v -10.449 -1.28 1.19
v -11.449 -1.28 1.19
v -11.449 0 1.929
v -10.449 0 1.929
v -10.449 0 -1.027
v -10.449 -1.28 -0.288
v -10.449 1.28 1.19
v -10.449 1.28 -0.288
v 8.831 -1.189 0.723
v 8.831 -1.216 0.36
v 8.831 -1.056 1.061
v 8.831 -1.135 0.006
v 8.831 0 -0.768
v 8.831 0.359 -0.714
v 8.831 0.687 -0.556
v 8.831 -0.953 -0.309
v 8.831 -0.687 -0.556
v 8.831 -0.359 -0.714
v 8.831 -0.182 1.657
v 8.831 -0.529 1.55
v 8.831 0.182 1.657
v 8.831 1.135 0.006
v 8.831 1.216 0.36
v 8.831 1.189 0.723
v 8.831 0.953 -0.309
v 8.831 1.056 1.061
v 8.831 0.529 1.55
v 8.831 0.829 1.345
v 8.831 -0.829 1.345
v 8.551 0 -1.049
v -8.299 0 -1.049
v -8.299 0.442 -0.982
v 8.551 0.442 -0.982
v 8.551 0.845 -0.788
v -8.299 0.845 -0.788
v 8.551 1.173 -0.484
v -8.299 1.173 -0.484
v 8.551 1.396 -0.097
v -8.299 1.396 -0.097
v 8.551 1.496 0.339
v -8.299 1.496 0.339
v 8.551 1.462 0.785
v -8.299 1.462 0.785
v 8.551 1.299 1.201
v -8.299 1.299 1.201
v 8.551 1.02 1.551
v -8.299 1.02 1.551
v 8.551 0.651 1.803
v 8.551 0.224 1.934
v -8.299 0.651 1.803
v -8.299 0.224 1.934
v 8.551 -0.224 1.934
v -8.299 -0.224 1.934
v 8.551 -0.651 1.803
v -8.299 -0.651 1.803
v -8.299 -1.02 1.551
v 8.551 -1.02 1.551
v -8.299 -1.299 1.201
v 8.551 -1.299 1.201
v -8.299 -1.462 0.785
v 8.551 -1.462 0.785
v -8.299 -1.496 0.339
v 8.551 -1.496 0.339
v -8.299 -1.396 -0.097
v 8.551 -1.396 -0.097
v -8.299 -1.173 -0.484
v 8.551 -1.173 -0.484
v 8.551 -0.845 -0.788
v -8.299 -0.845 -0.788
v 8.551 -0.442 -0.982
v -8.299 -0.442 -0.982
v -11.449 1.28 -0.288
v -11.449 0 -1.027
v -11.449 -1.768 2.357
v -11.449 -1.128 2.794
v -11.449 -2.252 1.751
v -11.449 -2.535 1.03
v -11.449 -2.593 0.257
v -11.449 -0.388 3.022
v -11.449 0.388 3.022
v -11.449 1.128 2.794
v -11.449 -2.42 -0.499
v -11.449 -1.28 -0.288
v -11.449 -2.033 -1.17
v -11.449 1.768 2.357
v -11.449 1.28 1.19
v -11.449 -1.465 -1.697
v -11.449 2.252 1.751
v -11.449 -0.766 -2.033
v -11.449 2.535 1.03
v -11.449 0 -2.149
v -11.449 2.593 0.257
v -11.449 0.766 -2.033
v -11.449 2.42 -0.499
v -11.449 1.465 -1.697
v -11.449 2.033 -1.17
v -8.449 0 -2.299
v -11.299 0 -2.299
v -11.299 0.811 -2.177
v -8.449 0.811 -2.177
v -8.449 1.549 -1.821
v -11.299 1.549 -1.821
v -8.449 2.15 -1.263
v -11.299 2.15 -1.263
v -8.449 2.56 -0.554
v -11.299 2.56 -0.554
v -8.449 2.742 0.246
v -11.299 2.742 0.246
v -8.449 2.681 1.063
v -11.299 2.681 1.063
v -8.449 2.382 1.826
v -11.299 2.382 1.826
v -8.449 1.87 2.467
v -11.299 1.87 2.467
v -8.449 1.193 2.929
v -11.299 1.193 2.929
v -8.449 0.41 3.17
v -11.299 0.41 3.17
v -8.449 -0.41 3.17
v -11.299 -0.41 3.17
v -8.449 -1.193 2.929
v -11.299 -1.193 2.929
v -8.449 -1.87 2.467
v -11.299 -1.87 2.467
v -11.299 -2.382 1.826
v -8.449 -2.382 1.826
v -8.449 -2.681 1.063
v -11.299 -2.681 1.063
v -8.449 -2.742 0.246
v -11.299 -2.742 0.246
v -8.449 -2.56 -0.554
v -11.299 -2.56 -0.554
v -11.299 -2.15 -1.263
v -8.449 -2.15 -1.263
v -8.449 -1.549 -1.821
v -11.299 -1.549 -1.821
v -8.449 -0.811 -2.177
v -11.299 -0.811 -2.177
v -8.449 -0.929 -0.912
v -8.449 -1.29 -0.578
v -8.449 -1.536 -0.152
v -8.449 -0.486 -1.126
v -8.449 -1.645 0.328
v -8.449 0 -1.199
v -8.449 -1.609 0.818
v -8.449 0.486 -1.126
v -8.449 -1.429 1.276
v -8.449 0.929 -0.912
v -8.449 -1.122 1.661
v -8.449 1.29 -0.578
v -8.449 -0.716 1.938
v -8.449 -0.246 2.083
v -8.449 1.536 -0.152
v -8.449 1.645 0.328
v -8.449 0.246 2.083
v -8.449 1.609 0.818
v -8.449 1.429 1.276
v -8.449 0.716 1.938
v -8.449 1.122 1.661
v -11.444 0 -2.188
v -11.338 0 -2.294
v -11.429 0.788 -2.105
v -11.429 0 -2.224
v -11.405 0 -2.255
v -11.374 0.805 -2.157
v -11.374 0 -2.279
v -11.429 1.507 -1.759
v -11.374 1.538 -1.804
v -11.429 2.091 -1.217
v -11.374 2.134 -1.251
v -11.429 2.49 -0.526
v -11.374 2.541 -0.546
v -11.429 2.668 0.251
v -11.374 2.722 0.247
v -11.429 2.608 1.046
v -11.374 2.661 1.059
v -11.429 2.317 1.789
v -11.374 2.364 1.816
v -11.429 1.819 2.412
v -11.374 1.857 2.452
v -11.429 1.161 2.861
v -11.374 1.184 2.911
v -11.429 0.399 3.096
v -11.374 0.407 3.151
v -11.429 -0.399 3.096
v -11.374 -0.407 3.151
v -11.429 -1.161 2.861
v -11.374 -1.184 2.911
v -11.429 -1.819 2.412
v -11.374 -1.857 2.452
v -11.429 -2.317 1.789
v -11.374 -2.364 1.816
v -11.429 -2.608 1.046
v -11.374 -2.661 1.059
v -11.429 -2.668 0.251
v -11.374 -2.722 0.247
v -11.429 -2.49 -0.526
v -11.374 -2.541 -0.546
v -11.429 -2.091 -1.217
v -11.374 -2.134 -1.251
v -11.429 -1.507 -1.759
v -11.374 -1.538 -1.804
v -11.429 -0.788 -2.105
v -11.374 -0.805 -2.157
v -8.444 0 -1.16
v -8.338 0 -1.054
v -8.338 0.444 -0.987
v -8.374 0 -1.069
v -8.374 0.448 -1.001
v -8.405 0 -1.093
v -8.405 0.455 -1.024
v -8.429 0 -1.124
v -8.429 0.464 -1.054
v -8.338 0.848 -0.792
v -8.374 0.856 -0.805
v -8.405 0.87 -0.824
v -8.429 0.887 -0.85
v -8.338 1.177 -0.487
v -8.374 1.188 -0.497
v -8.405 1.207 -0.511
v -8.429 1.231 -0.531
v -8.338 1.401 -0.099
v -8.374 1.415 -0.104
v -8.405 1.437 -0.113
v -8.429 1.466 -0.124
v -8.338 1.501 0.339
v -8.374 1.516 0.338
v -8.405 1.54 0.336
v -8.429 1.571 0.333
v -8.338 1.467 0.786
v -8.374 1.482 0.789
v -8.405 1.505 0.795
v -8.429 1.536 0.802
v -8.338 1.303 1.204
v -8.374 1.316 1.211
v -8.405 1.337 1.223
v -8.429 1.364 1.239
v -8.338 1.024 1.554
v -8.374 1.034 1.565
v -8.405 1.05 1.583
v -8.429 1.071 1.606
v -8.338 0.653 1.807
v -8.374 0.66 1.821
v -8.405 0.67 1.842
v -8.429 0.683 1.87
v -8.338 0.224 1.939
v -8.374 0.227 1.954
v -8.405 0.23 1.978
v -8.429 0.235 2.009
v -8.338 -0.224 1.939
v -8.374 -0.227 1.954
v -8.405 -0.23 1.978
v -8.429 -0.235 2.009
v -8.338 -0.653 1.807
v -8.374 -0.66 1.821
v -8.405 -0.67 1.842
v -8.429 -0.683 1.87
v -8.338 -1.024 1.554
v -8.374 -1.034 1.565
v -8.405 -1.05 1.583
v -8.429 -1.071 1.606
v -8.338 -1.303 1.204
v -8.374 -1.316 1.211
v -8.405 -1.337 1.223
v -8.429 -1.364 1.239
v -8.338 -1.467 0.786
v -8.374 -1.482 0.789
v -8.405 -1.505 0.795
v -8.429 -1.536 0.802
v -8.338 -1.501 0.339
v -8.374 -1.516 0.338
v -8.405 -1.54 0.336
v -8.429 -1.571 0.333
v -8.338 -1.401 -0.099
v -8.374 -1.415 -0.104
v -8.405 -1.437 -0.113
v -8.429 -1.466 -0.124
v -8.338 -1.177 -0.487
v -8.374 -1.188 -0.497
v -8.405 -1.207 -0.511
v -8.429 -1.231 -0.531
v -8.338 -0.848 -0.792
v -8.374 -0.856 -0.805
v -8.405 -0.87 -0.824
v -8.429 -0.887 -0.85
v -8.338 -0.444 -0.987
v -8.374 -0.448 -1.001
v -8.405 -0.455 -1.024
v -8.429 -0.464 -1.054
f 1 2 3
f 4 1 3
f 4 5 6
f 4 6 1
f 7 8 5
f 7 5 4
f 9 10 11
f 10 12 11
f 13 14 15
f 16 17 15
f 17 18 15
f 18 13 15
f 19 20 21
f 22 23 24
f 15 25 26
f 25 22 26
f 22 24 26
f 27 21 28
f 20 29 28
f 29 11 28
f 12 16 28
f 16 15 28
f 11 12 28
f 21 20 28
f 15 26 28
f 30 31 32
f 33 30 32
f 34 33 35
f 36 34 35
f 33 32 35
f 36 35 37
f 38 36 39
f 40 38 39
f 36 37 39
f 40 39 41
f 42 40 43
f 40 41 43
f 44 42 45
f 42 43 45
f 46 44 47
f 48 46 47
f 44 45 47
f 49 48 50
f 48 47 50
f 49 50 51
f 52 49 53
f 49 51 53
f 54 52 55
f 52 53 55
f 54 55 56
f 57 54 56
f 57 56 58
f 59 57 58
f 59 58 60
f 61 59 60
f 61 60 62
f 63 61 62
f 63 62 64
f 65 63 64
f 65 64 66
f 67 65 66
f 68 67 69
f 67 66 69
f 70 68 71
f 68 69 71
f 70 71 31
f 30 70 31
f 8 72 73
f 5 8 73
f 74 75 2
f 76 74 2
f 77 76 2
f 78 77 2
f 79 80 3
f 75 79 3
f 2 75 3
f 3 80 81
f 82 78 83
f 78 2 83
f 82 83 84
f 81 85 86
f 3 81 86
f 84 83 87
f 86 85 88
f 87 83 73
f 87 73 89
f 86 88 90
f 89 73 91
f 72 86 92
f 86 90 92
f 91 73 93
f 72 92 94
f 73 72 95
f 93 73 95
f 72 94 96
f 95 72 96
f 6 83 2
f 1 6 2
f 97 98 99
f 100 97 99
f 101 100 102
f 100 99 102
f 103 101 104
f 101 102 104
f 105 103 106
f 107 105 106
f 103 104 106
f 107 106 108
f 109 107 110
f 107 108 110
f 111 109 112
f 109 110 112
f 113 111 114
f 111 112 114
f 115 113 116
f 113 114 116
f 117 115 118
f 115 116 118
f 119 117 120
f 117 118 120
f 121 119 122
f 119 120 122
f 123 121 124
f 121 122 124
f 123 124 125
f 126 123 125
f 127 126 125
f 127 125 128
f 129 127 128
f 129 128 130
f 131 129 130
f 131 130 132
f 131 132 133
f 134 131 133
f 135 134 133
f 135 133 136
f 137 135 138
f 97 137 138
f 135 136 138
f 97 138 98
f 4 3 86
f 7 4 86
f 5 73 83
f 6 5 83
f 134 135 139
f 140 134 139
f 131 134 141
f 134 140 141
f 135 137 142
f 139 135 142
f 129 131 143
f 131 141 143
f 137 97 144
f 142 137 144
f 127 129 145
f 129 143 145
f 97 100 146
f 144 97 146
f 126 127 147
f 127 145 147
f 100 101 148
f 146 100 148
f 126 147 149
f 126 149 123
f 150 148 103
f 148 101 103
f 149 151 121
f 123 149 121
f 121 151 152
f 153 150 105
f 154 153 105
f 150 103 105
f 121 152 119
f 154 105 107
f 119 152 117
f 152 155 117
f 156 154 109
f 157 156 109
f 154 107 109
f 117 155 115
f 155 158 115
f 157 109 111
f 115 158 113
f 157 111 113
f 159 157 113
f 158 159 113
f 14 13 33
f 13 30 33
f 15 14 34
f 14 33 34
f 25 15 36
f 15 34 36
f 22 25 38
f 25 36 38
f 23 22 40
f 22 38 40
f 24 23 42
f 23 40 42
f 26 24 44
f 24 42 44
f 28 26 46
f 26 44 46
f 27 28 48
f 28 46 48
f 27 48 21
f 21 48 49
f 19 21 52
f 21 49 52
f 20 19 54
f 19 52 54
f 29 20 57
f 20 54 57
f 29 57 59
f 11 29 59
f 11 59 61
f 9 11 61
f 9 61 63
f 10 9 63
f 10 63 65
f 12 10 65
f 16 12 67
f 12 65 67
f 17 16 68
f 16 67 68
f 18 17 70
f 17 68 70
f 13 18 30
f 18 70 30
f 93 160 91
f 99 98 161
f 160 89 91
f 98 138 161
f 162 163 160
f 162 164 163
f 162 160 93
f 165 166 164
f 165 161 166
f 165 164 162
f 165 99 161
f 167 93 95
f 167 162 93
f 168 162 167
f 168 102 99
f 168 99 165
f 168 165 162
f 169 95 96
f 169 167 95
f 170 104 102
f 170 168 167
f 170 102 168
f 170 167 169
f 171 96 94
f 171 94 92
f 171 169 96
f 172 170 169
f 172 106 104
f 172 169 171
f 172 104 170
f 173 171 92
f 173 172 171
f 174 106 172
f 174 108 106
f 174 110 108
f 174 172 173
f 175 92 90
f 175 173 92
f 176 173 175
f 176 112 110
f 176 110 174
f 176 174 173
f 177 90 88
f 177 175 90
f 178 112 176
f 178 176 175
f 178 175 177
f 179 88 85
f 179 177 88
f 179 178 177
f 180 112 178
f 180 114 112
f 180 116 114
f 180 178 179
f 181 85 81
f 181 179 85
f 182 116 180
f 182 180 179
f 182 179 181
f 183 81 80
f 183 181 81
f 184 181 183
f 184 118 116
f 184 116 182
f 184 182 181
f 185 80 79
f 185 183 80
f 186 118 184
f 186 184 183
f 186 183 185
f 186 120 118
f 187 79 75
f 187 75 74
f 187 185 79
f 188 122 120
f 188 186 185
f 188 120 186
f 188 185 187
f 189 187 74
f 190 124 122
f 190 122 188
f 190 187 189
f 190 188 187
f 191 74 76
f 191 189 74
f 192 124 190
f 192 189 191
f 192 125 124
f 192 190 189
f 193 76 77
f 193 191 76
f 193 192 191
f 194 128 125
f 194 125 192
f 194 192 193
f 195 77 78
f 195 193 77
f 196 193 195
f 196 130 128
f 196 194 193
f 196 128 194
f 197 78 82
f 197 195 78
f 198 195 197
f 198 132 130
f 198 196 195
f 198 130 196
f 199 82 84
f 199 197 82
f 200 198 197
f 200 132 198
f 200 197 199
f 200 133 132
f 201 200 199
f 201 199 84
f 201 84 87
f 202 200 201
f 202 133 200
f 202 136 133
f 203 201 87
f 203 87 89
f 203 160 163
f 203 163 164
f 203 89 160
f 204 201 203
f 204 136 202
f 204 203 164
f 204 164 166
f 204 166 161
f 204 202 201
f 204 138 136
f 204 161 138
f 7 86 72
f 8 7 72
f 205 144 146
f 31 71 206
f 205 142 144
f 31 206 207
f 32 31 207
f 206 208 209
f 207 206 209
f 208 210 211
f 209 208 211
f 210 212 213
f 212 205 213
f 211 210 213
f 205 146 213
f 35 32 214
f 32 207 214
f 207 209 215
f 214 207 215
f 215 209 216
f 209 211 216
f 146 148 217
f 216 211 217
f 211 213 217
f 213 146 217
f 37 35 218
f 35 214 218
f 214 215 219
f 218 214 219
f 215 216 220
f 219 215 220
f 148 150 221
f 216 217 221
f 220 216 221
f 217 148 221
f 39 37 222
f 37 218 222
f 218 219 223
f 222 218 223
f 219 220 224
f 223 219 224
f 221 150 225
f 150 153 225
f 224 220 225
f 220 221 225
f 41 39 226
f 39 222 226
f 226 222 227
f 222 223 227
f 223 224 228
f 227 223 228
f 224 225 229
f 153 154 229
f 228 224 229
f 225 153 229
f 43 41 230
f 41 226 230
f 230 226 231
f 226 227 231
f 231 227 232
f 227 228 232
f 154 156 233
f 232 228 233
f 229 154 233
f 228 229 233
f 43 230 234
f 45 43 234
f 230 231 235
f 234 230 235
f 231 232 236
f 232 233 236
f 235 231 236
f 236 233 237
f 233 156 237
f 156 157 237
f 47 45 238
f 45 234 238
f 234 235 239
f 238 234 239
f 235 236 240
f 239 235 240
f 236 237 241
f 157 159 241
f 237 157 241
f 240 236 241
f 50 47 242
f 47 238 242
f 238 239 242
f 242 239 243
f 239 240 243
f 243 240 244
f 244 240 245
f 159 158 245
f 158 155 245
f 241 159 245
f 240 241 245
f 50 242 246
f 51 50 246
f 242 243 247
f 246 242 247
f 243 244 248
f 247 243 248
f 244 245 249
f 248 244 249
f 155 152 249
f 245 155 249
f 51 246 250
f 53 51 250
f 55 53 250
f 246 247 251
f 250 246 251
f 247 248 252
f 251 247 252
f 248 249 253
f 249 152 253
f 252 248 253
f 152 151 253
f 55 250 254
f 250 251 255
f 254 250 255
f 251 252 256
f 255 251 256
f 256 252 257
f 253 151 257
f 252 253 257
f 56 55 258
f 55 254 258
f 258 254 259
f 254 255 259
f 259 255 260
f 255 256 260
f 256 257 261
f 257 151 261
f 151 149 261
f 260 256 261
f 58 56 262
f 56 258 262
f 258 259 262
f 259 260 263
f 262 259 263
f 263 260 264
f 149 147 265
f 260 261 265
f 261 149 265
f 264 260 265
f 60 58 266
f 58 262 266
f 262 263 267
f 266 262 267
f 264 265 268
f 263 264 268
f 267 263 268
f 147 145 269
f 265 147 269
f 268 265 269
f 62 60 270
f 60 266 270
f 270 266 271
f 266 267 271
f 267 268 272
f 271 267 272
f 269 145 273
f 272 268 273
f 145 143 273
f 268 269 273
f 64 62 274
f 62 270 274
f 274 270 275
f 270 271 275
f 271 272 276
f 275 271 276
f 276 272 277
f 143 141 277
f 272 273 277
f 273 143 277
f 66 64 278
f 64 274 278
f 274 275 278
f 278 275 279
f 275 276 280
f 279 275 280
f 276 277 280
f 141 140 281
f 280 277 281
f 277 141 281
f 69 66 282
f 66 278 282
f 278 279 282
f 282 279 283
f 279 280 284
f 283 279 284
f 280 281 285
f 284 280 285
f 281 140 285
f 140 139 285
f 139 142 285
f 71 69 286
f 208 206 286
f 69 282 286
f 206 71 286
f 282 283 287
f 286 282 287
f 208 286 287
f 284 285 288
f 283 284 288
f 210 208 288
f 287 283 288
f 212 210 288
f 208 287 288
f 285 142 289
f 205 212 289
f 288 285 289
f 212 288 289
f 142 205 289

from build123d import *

# Parameters (mm, degrees)
FILLET2_R          = 0.15
CUT_EXTRUDE1_DEPTH = 1


with BuildPart() as part:
    # Sketch1 → Revolve2 (revolve)
    with BuildSketch(Plane(origin=(0, 0, 0), x_dir=(1, 0, 0), z_dir=(0, 1, 0))):
        Polygon((-11.44921875, 2.298828125), (-11.44921875, -0.451171875), (8.83128125, -0.451171875), (8.83128125, 0.768328125), (8.55078125, 1.048828125), (-8.44921875, 1.048828125), (-8.44921875, 2.298828125), align=None)
    revolve(axis=Axis((-15.512494932, 0, 0.451171875), (1, 0, 0)))

    # Fillet2
    fillet2_edges = [part.edges().sort_by_distance(p)[0] for p in [
        (-11.44921875, 0, 3.201171875),
        (-8.44921875, 0, 1.951171875),
    ]]
    fillet(fillet2_edges, radius=FILLET2_R)

    # Sketch3 → Cut-Extrude1 (cut)
    with BuildSketch(Plane.ZY.offset(11.44921875)):
        Polygon((1.190118859, -1.280035428), (1.929188565, -7.0854e-05), (1.190241581, 1.279964574), (-0.287775109, 1.280035428), (-1.026844815, 7.0854e-05), (-0.287897831, -1.279964574), align=None)
    extrude(amount=-CUT_EXTRUDE1_DEPTH, mode=Mode.SUBTRACT)


solid = part.part
